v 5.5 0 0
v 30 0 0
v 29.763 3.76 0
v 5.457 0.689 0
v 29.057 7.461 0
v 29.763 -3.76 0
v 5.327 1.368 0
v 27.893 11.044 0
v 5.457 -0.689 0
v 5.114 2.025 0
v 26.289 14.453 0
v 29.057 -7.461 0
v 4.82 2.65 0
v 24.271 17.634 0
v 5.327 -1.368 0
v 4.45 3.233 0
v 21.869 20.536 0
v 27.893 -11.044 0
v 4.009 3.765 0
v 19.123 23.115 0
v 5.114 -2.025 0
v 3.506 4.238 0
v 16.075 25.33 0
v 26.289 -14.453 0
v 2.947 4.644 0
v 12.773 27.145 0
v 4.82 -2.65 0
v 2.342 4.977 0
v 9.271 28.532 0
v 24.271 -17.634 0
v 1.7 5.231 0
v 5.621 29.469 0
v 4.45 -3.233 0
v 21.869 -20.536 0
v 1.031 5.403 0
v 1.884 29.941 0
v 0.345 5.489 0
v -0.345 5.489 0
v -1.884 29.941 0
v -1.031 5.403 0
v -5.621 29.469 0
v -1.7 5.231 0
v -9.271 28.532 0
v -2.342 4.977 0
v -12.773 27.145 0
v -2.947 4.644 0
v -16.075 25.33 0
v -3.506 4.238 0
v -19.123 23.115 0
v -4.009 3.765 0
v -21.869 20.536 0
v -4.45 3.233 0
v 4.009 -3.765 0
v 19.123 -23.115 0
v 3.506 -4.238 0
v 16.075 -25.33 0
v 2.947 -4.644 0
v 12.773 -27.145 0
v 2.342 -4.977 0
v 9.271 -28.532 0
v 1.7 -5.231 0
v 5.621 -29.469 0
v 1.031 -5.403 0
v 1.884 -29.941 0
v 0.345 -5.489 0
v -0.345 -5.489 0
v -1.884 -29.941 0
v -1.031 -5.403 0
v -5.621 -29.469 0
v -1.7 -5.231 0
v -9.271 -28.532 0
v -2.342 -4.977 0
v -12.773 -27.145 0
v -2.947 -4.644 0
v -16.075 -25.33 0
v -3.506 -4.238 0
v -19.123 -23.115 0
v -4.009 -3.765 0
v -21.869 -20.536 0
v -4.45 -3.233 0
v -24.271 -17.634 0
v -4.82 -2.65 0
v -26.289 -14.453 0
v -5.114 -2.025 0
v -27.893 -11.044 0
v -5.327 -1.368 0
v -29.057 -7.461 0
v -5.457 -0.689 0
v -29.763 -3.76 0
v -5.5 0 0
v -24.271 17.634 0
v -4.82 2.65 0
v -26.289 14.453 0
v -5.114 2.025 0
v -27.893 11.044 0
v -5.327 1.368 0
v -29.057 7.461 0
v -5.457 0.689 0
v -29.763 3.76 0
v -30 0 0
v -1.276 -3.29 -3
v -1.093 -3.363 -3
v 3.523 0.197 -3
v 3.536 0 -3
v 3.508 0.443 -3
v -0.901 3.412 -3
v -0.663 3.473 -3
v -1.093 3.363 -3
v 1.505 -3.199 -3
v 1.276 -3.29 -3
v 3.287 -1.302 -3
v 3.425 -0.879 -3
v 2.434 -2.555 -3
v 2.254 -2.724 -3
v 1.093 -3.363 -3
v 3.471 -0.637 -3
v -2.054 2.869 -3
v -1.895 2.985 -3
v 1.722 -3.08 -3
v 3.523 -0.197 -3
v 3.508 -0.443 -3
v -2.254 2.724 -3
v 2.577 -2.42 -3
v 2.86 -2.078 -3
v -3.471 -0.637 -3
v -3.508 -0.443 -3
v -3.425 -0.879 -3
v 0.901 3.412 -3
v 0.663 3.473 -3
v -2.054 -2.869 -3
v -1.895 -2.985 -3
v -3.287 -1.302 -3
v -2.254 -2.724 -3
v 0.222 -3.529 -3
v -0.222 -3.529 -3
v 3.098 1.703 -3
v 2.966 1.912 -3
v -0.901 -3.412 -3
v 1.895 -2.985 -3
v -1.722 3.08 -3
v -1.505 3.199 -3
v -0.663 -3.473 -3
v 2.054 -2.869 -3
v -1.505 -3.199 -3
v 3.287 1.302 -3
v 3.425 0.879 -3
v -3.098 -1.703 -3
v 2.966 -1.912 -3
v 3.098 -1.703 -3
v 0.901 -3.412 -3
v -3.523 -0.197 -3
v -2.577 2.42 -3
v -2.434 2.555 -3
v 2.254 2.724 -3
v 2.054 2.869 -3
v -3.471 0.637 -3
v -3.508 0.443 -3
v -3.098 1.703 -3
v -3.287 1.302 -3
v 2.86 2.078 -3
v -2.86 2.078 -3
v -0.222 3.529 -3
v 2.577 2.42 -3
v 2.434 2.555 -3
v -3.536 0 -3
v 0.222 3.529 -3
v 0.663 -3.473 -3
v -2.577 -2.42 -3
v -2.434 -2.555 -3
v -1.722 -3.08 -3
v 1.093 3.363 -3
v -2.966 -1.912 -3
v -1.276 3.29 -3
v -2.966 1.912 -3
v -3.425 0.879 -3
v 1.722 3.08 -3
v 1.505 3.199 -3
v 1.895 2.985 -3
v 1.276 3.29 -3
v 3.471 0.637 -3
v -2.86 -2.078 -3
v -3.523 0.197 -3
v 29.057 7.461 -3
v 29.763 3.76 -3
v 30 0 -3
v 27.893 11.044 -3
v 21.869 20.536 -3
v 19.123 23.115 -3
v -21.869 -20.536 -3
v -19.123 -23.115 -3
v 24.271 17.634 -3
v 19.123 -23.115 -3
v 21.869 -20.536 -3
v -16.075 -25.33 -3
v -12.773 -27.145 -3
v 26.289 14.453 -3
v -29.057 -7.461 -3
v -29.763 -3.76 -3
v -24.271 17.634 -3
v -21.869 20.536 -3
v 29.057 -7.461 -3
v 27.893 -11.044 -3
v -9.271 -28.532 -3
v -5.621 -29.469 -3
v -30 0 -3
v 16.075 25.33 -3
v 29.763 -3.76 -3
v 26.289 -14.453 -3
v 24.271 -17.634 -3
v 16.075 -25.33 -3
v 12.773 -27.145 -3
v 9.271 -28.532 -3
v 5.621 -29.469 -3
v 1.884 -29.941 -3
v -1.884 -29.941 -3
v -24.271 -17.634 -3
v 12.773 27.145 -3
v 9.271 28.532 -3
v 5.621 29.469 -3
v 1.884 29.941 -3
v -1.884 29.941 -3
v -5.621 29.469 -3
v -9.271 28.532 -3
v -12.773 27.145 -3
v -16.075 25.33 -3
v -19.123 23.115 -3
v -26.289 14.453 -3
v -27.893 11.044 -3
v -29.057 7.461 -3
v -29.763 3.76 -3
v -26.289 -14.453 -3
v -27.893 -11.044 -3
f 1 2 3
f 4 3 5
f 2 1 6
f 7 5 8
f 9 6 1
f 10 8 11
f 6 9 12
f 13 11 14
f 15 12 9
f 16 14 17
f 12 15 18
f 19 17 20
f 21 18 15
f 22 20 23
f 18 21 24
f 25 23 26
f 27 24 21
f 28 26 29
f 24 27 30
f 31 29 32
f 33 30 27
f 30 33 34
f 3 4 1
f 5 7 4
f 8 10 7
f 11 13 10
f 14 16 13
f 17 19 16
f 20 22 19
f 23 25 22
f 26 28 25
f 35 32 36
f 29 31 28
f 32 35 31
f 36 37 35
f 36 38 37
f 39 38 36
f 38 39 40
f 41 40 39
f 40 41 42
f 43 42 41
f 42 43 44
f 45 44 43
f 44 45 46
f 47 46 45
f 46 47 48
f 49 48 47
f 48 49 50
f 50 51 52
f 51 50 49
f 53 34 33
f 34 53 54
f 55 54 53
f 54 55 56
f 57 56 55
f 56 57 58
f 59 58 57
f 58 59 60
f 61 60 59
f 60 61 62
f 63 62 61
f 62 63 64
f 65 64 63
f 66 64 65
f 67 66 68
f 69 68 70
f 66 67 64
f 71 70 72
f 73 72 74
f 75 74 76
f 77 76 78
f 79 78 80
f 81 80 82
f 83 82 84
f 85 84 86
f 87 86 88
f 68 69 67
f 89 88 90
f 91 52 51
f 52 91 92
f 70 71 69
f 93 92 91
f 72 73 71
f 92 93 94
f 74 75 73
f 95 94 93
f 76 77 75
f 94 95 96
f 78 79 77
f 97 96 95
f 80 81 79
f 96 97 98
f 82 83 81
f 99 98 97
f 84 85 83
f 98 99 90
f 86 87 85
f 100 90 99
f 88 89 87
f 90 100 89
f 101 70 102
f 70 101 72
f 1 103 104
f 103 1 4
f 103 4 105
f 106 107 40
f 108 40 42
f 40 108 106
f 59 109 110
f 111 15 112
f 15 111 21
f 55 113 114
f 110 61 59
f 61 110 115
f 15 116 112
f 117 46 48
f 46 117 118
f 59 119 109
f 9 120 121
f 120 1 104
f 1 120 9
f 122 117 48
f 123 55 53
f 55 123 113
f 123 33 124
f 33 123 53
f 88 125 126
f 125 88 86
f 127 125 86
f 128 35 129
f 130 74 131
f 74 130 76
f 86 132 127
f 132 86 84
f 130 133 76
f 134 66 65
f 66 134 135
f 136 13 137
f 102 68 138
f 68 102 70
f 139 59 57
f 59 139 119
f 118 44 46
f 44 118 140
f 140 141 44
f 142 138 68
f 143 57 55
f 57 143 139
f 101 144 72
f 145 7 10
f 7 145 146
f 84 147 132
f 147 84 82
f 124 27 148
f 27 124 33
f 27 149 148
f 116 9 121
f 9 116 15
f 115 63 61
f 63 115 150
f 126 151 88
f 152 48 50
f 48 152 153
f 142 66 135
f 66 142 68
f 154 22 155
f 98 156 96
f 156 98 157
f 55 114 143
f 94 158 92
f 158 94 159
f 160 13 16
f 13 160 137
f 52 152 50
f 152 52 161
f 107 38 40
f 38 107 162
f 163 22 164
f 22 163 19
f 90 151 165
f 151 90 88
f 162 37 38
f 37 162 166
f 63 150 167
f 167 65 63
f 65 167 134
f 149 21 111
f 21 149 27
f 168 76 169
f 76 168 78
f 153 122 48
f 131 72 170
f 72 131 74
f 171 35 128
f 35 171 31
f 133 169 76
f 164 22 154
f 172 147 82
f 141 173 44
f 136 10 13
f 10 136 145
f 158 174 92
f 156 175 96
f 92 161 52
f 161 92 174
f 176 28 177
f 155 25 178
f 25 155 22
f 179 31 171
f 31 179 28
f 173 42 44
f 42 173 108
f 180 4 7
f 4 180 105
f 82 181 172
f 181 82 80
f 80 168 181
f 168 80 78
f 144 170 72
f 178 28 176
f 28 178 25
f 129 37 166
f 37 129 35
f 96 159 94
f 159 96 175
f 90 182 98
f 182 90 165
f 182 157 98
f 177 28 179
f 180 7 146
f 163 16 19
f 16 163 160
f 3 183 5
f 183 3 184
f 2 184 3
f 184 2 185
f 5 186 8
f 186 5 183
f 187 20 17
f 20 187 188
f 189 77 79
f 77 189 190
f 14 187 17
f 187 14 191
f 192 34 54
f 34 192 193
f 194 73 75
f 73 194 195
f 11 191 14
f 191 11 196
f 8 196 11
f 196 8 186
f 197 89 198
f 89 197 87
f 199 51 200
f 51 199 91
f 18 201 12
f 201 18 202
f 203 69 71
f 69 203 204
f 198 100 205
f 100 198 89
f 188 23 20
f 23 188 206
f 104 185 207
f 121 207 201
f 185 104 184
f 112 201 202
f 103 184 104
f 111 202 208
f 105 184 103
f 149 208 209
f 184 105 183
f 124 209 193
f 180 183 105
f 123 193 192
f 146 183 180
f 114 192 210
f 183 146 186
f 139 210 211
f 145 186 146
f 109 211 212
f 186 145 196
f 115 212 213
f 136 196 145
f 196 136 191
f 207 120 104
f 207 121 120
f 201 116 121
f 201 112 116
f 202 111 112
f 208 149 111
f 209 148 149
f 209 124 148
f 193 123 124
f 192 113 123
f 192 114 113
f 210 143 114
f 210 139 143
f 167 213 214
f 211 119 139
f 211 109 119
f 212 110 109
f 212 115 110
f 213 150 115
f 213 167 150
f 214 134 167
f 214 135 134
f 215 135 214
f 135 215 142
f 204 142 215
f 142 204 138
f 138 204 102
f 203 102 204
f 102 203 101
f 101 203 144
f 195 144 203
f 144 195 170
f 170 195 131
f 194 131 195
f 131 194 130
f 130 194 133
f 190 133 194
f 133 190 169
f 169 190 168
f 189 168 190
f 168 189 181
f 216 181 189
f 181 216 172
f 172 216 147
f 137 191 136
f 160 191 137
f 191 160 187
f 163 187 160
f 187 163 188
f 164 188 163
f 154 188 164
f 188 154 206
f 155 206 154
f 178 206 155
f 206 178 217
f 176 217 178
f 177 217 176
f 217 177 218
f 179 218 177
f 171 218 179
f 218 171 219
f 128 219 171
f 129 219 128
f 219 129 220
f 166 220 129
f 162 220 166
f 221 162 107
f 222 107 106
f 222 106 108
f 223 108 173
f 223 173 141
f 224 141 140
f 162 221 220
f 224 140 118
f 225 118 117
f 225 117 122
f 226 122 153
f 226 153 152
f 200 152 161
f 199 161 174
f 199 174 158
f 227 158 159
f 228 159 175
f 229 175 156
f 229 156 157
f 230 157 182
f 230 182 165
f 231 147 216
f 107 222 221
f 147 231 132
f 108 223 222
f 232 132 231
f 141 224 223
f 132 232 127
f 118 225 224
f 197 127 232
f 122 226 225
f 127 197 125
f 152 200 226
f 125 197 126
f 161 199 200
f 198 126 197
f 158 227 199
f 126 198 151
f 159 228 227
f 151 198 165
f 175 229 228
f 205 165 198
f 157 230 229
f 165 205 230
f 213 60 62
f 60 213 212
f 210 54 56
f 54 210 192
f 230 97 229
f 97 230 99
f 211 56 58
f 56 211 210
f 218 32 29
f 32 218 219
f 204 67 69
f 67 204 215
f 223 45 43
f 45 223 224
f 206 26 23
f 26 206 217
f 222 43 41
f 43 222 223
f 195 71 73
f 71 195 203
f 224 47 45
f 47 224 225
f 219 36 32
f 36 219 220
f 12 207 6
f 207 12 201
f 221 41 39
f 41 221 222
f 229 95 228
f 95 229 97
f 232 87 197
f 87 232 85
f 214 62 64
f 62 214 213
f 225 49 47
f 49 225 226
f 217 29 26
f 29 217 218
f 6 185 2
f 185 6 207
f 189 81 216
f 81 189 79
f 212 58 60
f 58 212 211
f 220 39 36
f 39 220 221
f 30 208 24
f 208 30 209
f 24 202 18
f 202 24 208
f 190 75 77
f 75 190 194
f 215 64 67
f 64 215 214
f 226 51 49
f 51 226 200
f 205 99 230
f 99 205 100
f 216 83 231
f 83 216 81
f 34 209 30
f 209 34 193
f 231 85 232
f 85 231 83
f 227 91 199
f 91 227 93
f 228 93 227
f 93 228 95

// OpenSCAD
$fn = 50;

difference() {
	union() {
		translate(v = [0, 0, -3.0]) {
			cylinder(h = 3, r = 30.0);
		}
	}
	union() {
		translate(v = [0, 0, 0]) {
			rotate(a = [0, 0, 0]) {
				difference() {
					union() {
						translate(v = [0, 0, -6.0]) {
							cylinder(h = 6, r = 2.25);
						}
						translate(v = [0, 0, -4.2]) {
							cylinder(h = 4.2, r1 = 2.75, r2 = 5.5);
						}
						translate(v = [0, 0, -6.0]) {
							cylinder(h = 6, r = 2.75);
						}
						translate(v = [0, 0, -6.0]) {
							cylinder(h = 6, r = 2.25);
						}
					}
					union();
				}
			}
		}
	}
}
